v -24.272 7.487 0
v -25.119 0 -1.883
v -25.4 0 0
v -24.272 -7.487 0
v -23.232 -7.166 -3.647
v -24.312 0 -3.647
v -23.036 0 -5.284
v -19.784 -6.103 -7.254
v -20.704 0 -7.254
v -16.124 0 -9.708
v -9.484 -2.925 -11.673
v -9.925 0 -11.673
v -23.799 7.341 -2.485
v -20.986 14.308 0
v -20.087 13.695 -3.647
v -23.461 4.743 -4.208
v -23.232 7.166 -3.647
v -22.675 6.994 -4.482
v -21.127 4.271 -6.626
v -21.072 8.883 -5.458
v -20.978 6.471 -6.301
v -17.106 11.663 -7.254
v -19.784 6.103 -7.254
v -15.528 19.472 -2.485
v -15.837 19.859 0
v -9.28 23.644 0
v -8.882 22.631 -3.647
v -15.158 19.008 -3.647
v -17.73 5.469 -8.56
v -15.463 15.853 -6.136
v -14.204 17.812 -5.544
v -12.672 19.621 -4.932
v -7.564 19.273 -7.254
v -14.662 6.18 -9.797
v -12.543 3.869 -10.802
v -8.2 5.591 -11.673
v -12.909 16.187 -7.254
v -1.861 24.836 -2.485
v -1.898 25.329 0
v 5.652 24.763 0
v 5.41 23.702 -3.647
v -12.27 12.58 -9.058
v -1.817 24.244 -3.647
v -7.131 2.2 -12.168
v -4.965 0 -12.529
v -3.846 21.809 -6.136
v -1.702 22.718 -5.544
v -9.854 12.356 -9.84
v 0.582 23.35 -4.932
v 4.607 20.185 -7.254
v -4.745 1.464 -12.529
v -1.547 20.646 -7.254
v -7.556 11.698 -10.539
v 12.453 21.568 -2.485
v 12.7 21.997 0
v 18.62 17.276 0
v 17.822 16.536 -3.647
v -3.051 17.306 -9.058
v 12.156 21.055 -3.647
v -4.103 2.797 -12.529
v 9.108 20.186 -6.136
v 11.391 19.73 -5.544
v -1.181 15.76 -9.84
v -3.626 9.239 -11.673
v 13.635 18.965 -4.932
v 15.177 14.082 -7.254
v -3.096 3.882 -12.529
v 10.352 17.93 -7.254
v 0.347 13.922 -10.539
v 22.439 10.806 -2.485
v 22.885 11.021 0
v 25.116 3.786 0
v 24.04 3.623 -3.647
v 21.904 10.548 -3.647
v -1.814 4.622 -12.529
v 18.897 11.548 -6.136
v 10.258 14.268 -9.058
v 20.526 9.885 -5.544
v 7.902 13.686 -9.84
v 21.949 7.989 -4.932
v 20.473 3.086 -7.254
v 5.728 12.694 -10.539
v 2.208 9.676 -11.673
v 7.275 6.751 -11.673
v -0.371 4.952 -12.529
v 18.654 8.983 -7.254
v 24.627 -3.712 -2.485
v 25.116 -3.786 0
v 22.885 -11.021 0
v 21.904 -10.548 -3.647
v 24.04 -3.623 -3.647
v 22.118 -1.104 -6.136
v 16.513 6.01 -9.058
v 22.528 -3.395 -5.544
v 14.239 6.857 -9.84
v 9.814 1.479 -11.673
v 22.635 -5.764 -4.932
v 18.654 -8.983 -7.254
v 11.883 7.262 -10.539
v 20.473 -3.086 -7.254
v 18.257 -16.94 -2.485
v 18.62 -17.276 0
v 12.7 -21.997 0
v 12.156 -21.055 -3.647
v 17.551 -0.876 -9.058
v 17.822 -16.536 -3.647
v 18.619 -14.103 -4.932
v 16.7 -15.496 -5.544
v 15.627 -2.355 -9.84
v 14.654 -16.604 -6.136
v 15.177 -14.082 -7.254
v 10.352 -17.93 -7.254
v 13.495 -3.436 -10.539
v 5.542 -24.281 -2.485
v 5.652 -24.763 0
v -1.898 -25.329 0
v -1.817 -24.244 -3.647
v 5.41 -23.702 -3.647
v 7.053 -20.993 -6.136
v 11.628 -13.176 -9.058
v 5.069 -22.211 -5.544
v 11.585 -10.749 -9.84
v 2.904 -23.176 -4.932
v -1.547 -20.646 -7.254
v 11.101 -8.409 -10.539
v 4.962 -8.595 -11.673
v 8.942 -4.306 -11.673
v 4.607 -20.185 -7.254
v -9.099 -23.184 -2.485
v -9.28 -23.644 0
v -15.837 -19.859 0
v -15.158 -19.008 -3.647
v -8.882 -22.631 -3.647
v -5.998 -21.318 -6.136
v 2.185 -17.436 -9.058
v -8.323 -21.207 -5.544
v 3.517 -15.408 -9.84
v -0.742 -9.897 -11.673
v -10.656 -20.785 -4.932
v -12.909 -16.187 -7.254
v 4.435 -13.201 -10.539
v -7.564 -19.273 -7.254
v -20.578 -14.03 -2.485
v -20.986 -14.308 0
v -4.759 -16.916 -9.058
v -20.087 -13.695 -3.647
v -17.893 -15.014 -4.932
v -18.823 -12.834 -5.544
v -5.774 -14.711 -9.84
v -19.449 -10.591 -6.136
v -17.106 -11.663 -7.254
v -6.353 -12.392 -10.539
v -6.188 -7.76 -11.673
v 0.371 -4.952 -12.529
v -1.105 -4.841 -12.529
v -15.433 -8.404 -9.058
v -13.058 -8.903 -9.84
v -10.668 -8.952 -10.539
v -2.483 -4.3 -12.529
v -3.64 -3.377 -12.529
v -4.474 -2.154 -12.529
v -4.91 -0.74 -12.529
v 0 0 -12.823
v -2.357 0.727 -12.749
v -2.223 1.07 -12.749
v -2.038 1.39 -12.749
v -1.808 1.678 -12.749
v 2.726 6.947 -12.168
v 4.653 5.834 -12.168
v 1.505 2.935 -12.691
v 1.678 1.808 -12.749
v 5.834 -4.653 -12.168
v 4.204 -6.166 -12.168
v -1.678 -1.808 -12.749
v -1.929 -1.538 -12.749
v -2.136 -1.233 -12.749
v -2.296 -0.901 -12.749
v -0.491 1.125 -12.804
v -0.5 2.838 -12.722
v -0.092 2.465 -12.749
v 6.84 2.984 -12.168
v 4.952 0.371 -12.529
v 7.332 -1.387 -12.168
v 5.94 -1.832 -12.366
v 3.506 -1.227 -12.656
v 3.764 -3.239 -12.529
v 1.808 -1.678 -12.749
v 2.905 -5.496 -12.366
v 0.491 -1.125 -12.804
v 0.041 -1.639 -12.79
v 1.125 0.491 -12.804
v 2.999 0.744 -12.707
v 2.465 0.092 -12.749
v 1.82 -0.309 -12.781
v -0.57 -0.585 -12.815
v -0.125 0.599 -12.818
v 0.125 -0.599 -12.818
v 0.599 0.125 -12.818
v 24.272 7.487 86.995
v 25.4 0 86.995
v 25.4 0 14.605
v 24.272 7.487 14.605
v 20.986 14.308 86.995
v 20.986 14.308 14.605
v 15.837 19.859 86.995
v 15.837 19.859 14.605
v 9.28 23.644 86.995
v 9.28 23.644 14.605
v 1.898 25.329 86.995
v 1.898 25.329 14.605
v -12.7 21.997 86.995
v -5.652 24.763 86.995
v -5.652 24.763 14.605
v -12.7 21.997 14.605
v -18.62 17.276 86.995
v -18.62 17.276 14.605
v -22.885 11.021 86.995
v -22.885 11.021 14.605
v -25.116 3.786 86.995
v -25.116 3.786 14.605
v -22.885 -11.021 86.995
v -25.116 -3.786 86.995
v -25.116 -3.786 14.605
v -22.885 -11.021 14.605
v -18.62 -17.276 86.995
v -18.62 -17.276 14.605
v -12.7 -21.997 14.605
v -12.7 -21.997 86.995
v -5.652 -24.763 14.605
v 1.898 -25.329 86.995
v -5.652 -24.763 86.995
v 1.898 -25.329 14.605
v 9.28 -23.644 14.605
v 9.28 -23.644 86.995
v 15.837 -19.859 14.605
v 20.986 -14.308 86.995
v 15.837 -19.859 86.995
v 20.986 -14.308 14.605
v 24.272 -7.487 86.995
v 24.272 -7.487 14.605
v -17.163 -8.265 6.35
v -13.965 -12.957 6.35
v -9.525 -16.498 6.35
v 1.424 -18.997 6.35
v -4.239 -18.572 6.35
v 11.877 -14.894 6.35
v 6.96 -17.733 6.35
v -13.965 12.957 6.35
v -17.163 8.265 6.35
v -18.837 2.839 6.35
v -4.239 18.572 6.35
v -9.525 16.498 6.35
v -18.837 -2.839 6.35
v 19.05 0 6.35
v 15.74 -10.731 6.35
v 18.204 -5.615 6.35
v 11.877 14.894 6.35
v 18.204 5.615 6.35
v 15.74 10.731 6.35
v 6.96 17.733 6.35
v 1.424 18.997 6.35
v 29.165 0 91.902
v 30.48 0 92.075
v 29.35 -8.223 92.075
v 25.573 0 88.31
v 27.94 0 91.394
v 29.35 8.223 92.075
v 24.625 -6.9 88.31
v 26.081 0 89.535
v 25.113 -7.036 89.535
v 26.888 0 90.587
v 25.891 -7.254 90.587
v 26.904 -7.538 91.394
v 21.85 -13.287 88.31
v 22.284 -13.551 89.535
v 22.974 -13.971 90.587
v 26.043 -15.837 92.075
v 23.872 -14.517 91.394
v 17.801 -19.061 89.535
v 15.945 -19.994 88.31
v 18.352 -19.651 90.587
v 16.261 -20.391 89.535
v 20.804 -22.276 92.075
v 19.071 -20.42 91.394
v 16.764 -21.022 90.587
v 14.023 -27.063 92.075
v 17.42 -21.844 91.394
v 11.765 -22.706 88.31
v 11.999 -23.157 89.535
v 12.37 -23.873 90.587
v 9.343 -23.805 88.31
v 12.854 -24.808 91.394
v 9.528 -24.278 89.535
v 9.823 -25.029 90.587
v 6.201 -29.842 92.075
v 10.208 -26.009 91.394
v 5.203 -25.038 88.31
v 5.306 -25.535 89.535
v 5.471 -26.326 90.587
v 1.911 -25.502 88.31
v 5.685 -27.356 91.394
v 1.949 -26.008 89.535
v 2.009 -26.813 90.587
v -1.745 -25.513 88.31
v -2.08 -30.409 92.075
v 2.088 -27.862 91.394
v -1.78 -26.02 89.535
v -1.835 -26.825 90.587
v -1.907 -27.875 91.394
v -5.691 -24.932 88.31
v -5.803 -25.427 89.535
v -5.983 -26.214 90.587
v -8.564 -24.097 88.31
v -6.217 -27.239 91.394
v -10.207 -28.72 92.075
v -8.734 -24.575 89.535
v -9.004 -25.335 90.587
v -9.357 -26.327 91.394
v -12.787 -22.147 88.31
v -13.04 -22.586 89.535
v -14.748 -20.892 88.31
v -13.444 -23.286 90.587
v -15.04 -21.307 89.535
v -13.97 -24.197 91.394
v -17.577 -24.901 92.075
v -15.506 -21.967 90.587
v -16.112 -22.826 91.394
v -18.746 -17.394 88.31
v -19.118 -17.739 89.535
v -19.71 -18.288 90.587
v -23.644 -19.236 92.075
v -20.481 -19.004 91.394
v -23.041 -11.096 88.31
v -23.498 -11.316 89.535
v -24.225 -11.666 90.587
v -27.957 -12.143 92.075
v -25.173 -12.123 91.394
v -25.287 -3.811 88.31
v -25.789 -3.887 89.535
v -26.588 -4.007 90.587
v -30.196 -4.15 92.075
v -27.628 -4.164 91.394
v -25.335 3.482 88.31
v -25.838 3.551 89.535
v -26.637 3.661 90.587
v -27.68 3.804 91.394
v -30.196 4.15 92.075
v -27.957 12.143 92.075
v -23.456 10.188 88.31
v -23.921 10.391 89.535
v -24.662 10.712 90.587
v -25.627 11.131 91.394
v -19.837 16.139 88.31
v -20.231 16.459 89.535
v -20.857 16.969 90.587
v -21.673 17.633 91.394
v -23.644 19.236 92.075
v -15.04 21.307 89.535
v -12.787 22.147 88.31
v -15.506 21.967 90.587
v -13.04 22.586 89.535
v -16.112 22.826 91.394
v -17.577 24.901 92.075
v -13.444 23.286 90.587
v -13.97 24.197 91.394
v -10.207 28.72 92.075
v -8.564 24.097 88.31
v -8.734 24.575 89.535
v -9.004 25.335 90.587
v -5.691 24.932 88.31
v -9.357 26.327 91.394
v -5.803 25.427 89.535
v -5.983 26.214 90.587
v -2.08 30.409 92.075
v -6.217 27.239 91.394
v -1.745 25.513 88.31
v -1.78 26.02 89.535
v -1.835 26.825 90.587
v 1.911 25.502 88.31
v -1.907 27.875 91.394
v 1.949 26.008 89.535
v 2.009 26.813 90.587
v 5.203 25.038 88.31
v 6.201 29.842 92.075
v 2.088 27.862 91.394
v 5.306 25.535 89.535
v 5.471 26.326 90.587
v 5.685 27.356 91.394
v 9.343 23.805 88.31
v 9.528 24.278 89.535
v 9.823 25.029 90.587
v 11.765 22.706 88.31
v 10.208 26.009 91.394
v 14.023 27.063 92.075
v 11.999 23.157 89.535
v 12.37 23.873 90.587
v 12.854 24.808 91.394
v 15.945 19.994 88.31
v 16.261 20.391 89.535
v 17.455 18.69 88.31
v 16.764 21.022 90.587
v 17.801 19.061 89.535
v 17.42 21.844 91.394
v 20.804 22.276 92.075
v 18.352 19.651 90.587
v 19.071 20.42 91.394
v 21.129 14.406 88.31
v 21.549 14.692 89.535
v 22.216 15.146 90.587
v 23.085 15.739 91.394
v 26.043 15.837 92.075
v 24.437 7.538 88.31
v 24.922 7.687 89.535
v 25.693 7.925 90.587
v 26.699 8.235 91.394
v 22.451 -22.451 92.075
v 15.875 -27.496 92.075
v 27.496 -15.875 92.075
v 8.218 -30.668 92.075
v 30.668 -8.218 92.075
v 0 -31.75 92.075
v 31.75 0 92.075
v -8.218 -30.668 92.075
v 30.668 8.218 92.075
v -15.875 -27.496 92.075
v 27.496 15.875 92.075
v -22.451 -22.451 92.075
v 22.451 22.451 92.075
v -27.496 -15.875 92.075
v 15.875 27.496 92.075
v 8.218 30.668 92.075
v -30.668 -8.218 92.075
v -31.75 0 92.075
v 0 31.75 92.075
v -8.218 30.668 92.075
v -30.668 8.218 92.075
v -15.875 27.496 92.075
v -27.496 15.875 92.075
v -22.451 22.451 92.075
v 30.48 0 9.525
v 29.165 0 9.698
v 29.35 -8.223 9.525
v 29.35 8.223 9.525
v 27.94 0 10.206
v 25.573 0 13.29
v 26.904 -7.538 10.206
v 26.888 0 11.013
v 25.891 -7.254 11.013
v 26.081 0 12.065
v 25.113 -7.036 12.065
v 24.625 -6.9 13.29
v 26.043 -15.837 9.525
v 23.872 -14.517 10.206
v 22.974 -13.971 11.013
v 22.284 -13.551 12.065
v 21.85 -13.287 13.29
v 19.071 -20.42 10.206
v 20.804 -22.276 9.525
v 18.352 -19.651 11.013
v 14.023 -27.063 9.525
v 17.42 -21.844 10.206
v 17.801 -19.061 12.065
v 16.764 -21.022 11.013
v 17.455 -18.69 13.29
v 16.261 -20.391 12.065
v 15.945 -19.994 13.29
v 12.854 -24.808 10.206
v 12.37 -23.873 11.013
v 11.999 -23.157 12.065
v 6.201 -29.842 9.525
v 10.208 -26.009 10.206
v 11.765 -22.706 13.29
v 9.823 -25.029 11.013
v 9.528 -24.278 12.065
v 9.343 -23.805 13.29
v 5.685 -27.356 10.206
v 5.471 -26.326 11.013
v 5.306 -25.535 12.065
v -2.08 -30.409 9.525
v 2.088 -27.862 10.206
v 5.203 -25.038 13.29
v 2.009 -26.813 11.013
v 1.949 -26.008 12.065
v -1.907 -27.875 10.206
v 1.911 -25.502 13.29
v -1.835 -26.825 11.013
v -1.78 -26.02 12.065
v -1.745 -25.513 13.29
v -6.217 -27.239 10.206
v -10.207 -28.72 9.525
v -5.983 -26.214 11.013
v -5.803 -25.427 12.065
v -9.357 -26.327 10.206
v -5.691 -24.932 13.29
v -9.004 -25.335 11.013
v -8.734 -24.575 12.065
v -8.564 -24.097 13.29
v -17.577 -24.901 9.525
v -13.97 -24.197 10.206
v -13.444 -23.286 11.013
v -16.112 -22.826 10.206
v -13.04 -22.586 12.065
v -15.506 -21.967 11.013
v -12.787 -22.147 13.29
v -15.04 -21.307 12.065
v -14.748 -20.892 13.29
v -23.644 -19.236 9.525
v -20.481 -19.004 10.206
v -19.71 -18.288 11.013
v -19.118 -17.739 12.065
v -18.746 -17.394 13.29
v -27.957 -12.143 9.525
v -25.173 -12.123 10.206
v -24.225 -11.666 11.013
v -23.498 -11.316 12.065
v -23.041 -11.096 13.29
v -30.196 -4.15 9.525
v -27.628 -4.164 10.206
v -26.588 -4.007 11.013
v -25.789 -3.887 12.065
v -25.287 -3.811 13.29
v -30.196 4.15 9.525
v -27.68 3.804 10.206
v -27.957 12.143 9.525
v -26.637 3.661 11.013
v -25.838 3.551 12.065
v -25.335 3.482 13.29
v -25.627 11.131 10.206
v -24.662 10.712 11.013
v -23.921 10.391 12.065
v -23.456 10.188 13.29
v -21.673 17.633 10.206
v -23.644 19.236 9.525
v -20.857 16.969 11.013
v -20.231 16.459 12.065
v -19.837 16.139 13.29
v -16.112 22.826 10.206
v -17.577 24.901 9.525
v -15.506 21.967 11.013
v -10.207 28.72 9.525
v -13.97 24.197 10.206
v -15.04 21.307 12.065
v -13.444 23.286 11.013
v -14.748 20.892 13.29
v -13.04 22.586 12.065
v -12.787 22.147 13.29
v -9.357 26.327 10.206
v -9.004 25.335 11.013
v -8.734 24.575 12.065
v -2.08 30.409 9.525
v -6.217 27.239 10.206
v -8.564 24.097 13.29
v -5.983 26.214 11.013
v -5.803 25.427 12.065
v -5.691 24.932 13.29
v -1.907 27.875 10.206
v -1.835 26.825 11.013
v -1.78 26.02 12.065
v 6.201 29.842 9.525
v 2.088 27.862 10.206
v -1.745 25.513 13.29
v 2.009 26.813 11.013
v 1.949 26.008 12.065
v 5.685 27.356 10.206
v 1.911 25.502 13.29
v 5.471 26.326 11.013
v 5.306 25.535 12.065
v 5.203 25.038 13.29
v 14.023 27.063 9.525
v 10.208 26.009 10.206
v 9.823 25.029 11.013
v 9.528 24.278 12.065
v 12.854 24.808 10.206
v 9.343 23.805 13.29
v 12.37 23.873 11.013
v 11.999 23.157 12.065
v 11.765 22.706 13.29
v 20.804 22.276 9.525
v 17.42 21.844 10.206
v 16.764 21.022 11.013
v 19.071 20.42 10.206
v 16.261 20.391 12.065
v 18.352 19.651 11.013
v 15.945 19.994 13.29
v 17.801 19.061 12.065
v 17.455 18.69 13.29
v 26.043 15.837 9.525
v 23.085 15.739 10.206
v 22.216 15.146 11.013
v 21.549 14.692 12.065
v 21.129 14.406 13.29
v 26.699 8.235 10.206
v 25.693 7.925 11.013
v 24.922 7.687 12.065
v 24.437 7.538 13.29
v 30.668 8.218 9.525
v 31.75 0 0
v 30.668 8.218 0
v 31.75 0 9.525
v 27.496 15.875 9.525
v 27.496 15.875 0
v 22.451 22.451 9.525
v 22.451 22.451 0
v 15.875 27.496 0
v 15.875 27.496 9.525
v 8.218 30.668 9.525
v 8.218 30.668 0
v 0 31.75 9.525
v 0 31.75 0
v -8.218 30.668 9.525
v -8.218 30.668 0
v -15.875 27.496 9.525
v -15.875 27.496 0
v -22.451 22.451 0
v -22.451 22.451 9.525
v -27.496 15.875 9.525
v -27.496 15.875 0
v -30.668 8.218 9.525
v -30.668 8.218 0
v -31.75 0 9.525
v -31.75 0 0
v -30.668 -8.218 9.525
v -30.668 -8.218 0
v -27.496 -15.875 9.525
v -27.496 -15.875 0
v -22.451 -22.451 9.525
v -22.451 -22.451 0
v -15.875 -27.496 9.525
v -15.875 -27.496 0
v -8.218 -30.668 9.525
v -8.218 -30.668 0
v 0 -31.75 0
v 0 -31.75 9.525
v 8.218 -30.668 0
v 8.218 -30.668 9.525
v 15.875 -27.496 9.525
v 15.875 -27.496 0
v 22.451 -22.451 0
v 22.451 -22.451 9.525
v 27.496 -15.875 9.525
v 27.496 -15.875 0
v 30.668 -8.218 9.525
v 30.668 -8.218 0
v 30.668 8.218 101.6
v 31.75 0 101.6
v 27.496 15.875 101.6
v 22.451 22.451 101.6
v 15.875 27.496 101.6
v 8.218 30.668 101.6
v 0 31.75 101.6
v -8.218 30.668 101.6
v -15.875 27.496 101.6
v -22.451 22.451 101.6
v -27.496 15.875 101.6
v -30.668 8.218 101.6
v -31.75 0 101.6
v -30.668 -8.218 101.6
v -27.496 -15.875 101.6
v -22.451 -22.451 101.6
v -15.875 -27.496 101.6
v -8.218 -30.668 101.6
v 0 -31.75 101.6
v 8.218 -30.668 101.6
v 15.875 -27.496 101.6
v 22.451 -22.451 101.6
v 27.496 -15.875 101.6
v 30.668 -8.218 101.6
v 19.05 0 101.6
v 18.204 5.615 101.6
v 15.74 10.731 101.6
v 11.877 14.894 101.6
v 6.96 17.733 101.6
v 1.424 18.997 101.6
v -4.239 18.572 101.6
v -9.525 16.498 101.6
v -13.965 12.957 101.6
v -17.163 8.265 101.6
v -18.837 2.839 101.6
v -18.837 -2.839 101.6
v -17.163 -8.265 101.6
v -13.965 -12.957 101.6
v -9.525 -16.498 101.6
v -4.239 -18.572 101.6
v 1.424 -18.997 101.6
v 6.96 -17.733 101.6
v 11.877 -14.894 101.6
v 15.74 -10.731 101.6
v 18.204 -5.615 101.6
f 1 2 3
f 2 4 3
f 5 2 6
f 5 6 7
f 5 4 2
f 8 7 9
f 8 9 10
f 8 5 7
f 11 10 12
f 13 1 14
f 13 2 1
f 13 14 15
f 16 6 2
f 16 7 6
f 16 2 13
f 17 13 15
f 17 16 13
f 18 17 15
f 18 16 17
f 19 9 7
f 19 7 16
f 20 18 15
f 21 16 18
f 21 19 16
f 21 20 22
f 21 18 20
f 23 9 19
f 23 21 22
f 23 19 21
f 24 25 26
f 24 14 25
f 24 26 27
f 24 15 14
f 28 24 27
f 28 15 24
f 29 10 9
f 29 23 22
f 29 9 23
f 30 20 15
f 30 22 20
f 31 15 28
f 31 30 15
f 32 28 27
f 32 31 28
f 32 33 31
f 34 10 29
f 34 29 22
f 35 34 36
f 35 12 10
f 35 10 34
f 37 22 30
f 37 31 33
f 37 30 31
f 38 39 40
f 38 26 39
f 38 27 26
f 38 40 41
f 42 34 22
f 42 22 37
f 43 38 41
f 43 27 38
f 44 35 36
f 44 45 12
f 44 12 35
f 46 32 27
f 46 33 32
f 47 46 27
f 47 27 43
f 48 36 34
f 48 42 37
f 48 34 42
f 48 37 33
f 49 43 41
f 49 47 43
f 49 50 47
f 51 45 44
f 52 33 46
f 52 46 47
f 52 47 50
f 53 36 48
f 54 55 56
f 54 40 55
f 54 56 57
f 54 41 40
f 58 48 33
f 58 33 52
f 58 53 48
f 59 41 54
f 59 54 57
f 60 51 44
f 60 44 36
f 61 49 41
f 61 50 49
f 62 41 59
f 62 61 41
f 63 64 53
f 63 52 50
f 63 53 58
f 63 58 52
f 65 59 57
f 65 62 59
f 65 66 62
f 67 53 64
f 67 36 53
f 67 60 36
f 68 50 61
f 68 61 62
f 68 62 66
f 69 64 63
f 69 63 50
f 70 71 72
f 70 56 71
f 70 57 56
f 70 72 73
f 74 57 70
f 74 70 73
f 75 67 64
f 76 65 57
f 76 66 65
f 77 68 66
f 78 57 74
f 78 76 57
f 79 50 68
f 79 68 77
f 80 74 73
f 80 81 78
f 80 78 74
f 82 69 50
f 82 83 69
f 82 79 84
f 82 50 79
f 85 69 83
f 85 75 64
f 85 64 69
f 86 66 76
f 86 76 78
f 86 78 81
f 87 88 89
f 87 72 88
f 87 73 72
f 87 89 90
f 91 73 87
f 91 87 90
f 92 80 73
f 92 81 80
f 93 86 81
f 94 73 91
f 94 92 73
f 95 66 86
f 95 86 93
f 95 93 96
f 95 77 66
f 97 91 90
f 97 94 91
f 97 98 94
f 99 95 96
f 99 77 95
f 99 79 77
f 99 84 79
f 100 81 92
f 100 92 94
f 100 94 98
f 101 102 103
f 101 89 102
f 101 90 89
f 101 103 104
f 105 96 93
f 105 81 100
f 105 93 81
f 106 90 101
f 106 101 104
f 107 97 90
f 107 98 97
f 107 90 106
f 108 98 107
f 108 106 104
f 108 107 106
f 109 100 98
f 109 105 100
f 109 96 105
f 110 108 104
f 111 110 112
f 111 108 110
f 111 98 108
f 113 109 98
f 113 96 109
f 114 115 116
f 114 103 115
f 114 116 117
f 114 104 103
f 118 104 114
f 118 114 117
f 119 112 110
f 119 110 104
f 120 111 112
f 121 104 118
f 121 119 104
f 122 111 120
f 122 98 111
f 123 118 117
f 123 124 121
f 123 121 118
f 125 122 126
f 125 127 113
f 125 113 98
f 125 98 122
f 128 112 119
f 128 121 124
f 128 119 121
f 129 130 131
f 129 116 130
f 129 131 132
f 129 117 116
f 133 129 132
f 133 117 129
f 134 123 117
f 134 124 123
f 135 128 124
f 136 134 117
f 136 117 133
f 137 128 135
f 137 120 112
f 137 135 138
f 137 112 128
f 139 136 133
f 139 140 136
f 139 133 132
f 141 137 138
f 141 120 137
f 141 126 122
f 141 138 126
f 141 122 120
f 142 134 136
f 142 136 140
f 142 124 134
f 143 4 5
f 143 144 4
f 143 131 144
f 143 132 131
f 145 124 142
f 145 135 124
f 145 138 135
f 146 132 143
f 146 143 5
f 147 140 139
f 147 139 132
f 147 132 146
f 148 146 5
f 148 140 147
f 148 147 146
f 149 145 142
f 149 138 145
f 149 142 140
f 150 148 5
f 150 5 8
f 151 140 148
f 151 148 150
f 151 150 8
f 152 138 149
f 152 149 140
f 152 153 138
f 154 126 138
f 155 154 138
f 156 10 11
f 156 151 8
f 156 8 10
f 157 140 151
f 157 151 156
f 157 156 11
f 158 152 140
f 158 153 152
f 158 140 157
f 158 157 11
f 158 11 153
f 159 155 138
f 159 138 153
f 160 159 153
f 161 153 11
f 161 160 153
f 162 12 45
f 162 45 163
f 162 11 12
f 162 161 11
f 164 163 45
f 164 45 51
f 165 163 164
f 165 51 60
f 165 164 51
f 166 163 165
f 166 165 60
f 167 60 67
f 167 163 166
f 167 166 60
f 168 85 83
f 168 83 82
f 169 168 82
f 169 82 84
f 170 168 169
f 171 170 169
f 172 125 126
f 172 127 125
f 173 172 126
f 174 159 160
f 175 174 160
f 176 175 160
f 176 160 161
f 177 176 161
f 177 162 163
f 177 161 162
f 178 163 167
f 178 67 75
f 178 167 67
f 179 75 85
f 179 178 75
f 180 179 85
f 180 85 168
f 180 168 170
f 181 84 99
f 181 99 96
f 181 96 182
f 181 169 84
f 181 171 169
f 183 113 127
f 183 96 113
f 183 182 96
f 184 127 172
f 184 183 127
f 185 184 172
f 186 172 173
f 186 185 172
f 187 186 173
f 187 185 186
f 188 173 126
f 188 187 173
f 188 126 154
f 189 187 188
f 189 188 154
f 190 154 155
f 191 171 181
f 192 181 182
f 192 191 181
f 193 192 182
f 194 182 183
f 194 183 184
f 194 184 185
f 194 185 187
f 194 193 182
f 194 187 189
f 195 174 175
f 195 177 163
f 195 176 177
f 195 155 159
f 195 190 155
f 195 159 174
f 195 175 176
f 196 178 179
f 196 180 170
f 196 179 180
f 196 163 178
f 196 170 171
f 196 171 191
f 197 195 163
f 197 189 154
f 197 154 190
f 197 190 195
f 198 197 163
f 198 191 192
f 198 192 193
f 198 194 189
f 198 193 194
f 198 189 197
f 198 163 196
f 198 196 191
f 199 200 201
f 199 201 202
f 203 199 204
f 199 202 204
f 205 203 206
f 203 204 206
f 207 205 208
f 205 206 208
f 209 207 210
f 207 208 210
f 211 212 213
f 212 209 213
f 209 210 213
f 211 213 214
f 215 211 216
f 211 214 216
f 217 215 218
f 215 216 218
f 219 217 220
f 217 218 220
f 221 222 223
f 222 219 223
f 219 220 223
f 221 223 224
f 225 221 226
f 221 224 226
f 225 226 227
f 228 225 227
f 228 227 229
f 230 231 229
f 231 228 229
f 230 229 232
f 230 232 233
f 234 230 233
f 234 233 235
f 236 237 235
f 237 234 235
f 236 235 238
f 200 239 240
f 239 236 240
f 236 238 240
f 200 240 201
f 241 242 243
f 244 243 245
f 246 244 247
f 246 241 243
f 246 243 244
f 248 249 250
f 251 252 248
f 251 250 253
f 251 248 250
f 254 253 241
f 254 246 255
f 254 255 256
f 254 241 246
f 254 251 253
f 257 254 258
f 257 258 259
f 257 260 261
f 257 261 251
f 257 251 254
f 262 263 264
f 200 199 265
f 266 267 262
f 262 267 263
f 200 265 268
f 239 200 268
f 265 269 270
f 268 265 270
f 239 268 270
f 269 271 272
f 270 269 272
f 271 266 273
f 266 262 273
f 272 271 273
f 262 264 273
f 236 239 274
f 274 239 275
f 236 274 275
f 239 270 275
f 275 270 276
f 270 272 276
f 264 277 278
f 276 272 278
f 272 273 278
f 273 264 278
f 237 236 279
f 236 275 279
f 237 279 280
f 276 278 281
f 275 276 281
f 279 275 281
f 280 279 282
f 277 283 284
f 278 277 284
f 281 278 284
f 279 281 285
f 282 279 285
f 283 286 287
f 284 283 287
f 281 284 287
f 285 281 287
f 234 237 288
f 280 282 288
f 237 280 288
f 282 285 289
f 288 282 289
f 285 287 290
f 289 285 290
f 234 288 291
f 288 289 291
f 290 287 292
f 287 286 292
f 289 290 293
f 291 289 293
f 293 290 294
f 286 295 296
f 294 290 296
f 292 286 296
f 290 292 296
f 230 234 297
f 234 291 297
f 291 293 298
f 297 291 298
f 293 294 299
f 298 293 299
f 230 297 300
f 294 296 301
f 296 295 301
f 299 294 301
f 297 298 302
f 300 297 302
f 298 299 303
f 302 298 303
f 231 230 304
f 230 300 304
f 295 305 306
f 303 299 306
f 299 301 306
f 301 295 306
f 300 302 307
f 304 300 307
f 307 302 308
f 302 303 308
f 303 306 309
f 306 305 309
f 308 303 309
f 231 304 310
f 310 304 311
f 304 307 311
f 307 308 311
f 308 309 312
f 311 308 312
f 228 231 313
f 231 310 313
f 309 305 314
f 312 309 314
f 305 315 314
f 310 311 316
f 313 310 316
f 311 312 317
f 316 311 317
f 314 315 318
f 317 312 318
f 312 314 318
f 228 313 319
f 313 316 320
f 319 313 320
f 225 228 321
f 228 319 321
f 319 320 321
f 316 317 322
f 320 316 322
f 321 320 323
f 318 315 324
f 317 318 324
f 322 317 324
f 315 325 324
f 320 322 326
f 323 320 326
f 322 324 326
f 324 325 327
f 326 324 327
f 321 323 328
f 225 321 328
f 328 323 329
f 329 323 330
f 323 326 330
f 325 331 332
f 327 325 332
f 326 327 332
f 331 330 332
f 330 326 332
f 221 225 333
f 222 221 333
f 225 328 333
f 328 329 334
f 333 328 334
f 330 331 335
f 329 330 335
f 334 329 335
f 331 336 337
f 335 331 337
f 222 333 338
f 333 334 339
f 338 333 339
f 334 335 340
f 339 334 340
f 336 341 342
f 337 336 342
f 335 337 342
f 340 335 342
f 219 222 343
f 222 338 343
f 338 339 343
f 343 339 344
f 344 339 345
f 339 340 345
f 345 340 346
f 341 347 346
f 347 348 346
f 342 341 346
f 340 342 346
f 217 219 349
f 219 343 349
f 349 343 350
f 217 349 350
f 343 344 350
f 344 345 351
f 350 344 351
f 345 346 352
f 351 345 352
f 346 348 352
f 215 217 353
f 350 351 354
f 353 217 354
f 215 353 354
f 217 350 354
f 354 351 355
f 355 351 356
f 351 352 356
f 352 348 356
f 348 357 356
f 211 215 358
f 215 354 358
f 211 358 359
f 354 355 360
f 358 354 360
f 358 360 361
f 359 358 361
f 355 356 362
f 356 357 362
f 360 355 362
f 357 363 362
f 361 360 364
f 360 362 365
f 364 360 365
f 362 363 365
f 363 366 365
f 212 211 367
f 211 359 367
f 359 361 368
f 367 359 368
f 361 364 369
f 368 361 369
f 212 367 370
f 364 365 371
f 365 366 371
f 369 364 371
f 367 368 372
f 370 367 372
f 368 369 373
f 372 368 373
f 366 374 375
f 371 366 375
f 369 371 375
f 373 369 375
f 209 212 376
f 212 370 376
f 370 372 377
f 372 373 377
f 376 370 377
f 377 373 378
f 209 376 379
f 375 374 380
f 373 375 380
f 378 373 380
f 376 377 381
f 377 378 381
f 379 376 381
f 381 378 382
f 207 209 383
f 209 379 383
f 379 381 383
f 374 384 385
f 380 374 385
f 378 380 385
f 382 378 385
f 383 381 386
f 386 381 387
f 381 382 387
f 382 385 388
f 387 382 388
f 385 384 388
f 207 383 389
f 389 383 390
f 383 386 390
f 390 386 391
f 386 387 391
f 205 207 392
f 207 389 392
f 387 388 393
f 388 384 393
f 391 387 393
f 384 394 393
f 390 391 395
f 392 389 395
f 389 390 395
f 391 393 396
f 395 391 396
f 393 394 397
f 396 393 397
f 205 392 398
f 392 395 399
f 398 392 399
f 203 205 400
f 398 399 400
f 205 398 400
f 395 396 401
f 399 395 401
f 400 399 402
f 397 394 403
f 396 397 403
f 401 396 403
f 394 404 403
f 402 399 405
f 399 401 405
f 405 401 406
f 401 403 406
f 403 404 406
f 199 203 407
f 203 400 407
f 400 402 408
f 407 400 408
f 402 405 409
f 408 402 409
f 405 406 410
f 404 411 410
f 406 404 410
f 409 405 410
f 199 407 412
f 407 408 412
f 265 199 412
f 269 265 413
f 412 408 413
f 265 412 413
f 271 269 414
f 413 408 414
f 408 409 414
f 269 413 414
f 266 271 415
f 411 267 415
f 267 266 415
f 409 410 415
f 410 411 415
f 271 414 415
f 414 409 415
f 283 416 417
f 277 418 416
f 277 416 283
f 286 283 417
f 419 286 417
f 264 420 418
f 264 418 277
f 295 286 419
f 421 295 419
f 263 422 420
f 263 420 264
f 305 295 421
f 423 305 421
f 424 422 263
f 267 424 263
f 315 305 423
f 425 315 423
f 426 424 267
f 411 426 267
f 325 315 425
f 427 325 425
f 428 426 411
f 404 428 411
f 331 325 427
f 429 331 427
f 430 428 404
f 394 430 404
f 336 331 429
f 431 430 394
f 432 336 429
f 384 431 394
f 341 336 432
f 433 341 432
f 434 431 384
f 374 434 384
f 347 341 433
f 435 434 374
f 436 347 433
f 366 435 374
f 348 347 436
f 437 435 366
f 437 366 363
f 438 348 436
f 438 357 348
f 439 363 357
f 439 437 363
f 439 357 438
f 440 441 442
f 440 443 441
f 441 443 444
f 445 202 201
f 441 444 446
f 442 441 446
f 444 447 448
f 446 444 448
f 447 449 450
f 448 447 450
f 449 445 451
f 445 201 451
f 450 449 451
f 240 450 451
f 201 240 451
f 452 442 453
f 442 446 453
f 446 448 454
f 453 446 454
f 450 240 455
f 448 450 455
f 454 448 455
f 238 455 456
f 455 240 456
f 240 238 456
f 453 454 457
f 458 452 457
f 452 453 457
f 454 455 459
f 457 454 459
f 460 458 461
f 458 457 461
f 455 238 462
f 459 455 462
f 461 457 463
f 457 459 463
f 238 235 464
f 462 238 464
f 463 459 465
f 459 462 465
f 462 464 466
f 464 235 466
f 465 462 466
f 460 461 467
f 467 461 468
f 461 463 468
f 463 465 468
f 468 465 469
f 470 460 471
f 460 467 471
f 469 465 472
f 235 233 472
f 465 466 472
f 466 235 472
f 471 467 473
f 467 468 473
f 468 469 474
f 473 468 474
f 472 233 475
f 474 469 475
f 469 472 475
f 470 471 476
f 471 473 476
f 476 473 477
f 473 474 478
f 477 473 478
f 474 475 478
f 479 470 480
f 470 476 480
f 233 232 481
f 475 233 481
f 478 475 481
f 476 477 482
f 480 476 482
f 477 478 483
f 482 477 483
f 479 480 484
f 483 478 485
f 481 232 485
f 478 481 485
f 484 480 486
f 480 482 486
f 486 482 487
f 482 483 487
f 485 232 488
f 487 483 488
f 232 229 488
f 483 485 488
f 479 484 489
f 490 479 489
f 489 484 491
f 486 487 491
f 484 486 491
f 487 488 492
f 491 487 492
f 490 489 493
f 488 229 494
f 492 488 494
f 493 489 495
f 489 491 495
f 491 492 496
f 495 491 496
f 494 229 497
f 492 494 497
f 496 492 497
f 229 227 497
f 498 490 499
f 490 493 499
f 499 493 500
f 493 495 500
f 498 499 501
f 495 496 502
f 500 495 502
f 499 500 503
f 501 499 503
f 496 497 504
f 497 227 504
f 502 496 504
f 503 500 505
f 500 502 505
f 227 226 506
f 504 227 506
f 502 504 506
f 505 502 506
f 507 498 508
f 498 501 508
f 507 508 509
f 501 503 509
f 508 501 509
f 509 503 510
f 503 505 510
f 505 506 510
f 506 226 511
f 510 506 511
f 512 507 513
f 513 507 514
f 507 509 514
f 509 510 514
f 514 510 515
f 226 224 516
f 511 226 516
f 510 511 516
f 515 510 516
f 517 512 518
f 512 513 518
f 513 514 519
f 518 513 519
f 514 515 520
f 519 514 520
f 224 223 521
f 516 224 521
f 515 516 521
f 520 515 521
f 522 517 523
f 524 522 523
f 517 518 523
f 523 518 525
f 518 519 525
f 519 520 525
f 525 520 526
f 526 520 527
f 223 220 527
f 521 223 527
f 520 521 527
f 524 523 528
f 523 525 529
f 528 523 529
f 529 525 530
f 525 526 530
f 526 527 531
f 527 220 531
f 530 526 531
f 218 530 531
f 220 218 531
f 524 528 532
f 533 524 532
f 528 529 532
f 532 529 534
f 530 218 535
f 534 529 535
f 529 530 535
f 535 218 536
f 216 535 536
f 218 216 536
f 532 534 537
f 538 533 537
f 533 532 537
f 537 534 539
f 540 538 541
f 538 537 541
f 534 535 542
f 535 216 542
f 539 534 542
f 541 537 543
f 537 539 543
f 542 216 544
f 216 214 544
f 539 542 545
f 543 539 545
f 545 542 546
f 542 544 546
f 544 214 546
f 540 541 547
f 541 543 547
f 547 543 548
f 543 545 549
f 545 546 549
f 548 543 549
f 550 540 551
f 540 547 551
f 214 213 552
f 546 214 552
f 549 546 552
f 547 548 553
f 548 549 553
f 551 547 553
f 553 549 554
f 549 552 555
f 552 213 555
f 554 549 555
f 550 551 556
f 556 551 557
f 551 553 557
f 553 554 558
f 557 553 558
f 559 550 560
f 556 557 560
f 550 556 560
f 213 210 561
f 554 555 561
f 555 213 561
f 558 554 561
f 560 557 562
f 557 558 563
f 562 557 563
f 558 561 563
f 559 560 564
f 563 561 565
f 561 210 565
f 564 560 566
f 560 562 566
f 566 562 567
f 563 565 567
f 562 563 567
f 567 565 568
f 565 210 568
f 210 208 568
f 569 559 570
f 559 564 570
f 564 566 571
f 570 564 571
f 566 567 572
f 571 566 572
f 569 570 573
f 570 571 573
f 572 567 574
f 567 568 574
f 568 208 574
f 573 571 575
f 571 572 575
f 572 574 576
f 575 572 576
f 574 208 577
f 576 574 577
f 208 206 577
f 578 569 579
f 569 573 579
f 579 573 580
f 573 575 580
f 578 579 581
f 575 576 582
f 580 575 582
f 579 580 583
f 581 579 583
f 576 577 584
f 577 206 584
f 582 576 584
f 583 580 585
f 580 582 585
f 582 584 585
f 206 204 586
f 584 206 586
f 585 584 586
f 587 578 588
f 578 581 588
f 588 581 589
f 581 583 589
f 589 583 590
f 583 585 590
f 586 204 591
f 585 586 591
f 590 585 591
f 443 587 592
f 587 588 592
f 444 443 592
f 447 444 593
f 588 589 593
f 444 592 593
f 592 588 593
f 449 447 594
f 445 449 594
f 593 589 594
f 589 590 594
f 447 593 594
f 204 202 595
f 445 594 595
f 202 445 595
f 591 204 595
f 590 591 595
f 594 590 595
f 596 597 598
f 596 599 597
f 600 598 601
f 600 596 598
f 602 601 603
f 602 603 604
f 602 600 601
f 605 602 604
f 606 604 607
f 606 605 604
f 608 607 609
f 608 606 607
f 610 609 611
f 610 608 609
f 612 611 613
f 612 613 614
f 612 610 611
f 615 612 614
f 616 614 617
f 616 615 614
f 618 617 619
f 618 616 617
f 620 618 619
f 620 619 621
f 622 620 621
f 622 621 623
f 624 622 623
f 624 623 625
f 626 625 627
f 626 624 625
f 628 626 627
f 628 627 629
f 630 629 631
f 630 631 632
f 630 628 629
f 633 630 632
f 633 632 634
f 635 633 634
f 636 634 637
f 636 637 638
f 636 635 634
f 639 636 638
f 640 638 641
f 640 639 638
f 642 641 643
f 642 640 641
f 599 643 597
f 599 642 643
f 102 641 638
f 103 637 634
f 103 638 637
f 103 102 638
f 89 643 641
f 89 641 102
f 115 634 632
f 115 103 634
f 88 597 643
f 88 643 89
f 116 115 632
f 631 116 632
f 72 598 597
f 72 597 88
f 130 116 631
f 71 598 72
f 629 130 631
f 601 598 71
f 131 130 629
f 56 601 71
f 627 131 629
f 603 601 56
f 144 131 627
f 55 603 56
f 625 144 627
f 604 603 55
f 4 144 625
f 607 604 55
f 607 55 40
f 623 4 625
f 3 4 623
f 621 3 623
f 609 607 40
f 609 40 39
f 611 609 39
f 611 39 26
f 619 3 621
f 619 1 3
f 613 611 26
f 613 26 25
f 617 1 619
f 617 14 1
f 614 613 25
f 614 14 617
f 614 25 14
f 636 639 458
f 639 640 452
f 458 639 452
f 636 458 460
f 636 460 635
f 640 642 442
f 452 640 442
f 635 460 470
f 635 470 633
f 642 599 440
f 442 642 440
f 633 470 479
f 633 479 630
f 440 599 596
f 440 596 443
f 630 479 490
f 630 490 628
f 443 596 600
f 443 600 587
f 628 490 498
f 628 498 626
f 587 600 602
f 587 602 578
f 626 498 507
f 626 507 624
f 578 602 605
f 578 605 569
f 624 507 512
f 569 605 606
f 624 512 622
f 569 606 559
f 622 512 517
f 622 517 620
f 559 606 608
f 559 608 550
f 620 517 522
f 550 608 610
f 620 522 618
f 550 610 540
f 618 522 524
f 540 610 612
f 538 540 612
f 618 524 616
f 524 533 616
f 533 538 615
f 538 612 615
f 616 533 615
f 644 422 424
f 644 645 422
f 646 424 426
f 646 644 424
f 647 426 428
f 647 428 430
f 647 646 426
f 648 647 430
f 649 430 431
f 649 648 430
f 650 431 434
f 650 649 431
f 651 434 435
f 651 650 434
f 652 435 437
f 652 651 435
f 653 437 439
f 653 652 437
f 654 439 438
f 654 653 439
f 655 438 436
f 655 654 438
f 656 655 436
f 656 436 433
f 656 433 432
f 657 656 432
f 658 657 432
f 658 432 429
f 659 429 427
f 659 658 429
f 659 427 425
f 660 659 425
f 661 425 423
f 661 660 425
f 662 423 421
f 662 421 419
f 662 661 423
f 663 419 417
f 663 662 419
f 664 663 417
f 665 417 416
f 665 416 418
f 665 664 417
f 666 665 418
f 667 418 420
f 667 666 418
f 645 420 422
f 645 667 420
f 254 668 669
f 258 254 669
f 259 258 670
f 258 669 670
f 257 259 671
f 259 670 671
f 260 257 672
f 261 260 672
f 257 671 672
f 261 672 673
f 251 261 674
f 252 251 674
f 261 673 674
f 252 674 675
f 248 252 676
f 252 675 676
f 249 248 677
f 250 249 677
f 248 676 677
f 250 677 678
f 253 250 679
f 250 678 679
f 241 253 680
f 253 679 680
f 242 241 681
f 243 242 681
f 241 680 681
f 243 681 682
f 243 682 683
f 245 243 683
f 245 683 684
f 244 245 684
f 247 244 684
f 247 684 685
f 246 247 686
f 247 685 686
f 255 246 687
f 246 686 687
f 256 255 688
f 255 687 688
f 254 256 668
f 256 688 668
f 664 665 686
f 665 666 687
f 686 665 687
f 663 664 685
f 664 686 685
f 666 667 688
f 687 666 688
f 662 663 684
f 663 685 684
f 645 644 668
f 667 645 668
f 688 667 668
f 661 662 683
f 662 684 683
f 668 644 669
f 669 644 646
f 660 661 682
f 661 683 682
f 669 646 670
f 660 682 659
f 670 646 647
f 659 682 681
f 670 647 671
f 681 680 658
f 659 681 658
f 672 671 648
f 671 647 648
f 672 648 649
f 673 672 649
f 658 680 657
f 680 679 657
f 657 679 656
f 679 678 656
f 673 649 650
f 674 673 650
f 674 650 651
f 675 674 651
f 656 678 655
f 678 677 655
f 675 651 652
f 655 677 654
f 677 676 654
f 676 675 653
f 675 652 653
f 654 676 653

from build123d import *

# Parameters (mm, degrees)
F0_R     = 25.4
F1_DEPTH = 101.6
F4_W     = 31.75
F4_H     = 9.525
F6_R     = 5.08
F7_R     = 19.05
F8_DEPTH = 95.25


with BuildPart() as f1:
    # F0 (on Top) → F1 (new body)
    with BuildSketch(Plane.XY):
        Circle(F0_R)
    extrude(amount=F1_DEPTH)

    # F2 (on Front) → F3 (revolve)
    with BuildSketch(Plane.XZ):
        with BuildLine():
            Line((0, -12.8230312839), (0, 0))
            Line((0, 0), (-25.4, 0))
            add(Edge.make_bspline(
                [(-25.4, 0), (-25.4, -7.7090621926), (-11.6054195191, -12.8230312839), (0, -12.8230312839)],
                knots=[0, 0, 0, 0, 28.4532973715, 28.4532973715, 28.4532973715, 28.4532973715], degree=3))
        make_face()
    revolve(axis=Axis((0, 0, -6.411515642), (0, 0, -1)))

    # F4 (on Front) → F5 (revolve)
    with BuildSketch(Plane.XZ):
        with Locations((15.875, 4.7625)):
            Rectangle(F4_W, F4_H)
        with Locations((15.875, 96.8375)):
            Rectangle(F4_W, F4_H)
    revolve(axis=Axis((0, 0, 4.7625), (0, 0, 1)))

    # F6
    f6_edges = [f1.edges().sort_by_distance(p)[0] for p in [
        (-25.4, 0, 92.075),
        (-25.4, 0, 9.525),
    ]]
    fillet(f6_edges, radius=F6_R)

    # F7 (on face) → F8 (cut)
    with BuildSketch(Plane.XY.offset(101.6)):
        Circle(F7_R)
    extrude(amount=-F8_DEPTH, mode=Mode.SUBTRACT)


solid = f1.part
